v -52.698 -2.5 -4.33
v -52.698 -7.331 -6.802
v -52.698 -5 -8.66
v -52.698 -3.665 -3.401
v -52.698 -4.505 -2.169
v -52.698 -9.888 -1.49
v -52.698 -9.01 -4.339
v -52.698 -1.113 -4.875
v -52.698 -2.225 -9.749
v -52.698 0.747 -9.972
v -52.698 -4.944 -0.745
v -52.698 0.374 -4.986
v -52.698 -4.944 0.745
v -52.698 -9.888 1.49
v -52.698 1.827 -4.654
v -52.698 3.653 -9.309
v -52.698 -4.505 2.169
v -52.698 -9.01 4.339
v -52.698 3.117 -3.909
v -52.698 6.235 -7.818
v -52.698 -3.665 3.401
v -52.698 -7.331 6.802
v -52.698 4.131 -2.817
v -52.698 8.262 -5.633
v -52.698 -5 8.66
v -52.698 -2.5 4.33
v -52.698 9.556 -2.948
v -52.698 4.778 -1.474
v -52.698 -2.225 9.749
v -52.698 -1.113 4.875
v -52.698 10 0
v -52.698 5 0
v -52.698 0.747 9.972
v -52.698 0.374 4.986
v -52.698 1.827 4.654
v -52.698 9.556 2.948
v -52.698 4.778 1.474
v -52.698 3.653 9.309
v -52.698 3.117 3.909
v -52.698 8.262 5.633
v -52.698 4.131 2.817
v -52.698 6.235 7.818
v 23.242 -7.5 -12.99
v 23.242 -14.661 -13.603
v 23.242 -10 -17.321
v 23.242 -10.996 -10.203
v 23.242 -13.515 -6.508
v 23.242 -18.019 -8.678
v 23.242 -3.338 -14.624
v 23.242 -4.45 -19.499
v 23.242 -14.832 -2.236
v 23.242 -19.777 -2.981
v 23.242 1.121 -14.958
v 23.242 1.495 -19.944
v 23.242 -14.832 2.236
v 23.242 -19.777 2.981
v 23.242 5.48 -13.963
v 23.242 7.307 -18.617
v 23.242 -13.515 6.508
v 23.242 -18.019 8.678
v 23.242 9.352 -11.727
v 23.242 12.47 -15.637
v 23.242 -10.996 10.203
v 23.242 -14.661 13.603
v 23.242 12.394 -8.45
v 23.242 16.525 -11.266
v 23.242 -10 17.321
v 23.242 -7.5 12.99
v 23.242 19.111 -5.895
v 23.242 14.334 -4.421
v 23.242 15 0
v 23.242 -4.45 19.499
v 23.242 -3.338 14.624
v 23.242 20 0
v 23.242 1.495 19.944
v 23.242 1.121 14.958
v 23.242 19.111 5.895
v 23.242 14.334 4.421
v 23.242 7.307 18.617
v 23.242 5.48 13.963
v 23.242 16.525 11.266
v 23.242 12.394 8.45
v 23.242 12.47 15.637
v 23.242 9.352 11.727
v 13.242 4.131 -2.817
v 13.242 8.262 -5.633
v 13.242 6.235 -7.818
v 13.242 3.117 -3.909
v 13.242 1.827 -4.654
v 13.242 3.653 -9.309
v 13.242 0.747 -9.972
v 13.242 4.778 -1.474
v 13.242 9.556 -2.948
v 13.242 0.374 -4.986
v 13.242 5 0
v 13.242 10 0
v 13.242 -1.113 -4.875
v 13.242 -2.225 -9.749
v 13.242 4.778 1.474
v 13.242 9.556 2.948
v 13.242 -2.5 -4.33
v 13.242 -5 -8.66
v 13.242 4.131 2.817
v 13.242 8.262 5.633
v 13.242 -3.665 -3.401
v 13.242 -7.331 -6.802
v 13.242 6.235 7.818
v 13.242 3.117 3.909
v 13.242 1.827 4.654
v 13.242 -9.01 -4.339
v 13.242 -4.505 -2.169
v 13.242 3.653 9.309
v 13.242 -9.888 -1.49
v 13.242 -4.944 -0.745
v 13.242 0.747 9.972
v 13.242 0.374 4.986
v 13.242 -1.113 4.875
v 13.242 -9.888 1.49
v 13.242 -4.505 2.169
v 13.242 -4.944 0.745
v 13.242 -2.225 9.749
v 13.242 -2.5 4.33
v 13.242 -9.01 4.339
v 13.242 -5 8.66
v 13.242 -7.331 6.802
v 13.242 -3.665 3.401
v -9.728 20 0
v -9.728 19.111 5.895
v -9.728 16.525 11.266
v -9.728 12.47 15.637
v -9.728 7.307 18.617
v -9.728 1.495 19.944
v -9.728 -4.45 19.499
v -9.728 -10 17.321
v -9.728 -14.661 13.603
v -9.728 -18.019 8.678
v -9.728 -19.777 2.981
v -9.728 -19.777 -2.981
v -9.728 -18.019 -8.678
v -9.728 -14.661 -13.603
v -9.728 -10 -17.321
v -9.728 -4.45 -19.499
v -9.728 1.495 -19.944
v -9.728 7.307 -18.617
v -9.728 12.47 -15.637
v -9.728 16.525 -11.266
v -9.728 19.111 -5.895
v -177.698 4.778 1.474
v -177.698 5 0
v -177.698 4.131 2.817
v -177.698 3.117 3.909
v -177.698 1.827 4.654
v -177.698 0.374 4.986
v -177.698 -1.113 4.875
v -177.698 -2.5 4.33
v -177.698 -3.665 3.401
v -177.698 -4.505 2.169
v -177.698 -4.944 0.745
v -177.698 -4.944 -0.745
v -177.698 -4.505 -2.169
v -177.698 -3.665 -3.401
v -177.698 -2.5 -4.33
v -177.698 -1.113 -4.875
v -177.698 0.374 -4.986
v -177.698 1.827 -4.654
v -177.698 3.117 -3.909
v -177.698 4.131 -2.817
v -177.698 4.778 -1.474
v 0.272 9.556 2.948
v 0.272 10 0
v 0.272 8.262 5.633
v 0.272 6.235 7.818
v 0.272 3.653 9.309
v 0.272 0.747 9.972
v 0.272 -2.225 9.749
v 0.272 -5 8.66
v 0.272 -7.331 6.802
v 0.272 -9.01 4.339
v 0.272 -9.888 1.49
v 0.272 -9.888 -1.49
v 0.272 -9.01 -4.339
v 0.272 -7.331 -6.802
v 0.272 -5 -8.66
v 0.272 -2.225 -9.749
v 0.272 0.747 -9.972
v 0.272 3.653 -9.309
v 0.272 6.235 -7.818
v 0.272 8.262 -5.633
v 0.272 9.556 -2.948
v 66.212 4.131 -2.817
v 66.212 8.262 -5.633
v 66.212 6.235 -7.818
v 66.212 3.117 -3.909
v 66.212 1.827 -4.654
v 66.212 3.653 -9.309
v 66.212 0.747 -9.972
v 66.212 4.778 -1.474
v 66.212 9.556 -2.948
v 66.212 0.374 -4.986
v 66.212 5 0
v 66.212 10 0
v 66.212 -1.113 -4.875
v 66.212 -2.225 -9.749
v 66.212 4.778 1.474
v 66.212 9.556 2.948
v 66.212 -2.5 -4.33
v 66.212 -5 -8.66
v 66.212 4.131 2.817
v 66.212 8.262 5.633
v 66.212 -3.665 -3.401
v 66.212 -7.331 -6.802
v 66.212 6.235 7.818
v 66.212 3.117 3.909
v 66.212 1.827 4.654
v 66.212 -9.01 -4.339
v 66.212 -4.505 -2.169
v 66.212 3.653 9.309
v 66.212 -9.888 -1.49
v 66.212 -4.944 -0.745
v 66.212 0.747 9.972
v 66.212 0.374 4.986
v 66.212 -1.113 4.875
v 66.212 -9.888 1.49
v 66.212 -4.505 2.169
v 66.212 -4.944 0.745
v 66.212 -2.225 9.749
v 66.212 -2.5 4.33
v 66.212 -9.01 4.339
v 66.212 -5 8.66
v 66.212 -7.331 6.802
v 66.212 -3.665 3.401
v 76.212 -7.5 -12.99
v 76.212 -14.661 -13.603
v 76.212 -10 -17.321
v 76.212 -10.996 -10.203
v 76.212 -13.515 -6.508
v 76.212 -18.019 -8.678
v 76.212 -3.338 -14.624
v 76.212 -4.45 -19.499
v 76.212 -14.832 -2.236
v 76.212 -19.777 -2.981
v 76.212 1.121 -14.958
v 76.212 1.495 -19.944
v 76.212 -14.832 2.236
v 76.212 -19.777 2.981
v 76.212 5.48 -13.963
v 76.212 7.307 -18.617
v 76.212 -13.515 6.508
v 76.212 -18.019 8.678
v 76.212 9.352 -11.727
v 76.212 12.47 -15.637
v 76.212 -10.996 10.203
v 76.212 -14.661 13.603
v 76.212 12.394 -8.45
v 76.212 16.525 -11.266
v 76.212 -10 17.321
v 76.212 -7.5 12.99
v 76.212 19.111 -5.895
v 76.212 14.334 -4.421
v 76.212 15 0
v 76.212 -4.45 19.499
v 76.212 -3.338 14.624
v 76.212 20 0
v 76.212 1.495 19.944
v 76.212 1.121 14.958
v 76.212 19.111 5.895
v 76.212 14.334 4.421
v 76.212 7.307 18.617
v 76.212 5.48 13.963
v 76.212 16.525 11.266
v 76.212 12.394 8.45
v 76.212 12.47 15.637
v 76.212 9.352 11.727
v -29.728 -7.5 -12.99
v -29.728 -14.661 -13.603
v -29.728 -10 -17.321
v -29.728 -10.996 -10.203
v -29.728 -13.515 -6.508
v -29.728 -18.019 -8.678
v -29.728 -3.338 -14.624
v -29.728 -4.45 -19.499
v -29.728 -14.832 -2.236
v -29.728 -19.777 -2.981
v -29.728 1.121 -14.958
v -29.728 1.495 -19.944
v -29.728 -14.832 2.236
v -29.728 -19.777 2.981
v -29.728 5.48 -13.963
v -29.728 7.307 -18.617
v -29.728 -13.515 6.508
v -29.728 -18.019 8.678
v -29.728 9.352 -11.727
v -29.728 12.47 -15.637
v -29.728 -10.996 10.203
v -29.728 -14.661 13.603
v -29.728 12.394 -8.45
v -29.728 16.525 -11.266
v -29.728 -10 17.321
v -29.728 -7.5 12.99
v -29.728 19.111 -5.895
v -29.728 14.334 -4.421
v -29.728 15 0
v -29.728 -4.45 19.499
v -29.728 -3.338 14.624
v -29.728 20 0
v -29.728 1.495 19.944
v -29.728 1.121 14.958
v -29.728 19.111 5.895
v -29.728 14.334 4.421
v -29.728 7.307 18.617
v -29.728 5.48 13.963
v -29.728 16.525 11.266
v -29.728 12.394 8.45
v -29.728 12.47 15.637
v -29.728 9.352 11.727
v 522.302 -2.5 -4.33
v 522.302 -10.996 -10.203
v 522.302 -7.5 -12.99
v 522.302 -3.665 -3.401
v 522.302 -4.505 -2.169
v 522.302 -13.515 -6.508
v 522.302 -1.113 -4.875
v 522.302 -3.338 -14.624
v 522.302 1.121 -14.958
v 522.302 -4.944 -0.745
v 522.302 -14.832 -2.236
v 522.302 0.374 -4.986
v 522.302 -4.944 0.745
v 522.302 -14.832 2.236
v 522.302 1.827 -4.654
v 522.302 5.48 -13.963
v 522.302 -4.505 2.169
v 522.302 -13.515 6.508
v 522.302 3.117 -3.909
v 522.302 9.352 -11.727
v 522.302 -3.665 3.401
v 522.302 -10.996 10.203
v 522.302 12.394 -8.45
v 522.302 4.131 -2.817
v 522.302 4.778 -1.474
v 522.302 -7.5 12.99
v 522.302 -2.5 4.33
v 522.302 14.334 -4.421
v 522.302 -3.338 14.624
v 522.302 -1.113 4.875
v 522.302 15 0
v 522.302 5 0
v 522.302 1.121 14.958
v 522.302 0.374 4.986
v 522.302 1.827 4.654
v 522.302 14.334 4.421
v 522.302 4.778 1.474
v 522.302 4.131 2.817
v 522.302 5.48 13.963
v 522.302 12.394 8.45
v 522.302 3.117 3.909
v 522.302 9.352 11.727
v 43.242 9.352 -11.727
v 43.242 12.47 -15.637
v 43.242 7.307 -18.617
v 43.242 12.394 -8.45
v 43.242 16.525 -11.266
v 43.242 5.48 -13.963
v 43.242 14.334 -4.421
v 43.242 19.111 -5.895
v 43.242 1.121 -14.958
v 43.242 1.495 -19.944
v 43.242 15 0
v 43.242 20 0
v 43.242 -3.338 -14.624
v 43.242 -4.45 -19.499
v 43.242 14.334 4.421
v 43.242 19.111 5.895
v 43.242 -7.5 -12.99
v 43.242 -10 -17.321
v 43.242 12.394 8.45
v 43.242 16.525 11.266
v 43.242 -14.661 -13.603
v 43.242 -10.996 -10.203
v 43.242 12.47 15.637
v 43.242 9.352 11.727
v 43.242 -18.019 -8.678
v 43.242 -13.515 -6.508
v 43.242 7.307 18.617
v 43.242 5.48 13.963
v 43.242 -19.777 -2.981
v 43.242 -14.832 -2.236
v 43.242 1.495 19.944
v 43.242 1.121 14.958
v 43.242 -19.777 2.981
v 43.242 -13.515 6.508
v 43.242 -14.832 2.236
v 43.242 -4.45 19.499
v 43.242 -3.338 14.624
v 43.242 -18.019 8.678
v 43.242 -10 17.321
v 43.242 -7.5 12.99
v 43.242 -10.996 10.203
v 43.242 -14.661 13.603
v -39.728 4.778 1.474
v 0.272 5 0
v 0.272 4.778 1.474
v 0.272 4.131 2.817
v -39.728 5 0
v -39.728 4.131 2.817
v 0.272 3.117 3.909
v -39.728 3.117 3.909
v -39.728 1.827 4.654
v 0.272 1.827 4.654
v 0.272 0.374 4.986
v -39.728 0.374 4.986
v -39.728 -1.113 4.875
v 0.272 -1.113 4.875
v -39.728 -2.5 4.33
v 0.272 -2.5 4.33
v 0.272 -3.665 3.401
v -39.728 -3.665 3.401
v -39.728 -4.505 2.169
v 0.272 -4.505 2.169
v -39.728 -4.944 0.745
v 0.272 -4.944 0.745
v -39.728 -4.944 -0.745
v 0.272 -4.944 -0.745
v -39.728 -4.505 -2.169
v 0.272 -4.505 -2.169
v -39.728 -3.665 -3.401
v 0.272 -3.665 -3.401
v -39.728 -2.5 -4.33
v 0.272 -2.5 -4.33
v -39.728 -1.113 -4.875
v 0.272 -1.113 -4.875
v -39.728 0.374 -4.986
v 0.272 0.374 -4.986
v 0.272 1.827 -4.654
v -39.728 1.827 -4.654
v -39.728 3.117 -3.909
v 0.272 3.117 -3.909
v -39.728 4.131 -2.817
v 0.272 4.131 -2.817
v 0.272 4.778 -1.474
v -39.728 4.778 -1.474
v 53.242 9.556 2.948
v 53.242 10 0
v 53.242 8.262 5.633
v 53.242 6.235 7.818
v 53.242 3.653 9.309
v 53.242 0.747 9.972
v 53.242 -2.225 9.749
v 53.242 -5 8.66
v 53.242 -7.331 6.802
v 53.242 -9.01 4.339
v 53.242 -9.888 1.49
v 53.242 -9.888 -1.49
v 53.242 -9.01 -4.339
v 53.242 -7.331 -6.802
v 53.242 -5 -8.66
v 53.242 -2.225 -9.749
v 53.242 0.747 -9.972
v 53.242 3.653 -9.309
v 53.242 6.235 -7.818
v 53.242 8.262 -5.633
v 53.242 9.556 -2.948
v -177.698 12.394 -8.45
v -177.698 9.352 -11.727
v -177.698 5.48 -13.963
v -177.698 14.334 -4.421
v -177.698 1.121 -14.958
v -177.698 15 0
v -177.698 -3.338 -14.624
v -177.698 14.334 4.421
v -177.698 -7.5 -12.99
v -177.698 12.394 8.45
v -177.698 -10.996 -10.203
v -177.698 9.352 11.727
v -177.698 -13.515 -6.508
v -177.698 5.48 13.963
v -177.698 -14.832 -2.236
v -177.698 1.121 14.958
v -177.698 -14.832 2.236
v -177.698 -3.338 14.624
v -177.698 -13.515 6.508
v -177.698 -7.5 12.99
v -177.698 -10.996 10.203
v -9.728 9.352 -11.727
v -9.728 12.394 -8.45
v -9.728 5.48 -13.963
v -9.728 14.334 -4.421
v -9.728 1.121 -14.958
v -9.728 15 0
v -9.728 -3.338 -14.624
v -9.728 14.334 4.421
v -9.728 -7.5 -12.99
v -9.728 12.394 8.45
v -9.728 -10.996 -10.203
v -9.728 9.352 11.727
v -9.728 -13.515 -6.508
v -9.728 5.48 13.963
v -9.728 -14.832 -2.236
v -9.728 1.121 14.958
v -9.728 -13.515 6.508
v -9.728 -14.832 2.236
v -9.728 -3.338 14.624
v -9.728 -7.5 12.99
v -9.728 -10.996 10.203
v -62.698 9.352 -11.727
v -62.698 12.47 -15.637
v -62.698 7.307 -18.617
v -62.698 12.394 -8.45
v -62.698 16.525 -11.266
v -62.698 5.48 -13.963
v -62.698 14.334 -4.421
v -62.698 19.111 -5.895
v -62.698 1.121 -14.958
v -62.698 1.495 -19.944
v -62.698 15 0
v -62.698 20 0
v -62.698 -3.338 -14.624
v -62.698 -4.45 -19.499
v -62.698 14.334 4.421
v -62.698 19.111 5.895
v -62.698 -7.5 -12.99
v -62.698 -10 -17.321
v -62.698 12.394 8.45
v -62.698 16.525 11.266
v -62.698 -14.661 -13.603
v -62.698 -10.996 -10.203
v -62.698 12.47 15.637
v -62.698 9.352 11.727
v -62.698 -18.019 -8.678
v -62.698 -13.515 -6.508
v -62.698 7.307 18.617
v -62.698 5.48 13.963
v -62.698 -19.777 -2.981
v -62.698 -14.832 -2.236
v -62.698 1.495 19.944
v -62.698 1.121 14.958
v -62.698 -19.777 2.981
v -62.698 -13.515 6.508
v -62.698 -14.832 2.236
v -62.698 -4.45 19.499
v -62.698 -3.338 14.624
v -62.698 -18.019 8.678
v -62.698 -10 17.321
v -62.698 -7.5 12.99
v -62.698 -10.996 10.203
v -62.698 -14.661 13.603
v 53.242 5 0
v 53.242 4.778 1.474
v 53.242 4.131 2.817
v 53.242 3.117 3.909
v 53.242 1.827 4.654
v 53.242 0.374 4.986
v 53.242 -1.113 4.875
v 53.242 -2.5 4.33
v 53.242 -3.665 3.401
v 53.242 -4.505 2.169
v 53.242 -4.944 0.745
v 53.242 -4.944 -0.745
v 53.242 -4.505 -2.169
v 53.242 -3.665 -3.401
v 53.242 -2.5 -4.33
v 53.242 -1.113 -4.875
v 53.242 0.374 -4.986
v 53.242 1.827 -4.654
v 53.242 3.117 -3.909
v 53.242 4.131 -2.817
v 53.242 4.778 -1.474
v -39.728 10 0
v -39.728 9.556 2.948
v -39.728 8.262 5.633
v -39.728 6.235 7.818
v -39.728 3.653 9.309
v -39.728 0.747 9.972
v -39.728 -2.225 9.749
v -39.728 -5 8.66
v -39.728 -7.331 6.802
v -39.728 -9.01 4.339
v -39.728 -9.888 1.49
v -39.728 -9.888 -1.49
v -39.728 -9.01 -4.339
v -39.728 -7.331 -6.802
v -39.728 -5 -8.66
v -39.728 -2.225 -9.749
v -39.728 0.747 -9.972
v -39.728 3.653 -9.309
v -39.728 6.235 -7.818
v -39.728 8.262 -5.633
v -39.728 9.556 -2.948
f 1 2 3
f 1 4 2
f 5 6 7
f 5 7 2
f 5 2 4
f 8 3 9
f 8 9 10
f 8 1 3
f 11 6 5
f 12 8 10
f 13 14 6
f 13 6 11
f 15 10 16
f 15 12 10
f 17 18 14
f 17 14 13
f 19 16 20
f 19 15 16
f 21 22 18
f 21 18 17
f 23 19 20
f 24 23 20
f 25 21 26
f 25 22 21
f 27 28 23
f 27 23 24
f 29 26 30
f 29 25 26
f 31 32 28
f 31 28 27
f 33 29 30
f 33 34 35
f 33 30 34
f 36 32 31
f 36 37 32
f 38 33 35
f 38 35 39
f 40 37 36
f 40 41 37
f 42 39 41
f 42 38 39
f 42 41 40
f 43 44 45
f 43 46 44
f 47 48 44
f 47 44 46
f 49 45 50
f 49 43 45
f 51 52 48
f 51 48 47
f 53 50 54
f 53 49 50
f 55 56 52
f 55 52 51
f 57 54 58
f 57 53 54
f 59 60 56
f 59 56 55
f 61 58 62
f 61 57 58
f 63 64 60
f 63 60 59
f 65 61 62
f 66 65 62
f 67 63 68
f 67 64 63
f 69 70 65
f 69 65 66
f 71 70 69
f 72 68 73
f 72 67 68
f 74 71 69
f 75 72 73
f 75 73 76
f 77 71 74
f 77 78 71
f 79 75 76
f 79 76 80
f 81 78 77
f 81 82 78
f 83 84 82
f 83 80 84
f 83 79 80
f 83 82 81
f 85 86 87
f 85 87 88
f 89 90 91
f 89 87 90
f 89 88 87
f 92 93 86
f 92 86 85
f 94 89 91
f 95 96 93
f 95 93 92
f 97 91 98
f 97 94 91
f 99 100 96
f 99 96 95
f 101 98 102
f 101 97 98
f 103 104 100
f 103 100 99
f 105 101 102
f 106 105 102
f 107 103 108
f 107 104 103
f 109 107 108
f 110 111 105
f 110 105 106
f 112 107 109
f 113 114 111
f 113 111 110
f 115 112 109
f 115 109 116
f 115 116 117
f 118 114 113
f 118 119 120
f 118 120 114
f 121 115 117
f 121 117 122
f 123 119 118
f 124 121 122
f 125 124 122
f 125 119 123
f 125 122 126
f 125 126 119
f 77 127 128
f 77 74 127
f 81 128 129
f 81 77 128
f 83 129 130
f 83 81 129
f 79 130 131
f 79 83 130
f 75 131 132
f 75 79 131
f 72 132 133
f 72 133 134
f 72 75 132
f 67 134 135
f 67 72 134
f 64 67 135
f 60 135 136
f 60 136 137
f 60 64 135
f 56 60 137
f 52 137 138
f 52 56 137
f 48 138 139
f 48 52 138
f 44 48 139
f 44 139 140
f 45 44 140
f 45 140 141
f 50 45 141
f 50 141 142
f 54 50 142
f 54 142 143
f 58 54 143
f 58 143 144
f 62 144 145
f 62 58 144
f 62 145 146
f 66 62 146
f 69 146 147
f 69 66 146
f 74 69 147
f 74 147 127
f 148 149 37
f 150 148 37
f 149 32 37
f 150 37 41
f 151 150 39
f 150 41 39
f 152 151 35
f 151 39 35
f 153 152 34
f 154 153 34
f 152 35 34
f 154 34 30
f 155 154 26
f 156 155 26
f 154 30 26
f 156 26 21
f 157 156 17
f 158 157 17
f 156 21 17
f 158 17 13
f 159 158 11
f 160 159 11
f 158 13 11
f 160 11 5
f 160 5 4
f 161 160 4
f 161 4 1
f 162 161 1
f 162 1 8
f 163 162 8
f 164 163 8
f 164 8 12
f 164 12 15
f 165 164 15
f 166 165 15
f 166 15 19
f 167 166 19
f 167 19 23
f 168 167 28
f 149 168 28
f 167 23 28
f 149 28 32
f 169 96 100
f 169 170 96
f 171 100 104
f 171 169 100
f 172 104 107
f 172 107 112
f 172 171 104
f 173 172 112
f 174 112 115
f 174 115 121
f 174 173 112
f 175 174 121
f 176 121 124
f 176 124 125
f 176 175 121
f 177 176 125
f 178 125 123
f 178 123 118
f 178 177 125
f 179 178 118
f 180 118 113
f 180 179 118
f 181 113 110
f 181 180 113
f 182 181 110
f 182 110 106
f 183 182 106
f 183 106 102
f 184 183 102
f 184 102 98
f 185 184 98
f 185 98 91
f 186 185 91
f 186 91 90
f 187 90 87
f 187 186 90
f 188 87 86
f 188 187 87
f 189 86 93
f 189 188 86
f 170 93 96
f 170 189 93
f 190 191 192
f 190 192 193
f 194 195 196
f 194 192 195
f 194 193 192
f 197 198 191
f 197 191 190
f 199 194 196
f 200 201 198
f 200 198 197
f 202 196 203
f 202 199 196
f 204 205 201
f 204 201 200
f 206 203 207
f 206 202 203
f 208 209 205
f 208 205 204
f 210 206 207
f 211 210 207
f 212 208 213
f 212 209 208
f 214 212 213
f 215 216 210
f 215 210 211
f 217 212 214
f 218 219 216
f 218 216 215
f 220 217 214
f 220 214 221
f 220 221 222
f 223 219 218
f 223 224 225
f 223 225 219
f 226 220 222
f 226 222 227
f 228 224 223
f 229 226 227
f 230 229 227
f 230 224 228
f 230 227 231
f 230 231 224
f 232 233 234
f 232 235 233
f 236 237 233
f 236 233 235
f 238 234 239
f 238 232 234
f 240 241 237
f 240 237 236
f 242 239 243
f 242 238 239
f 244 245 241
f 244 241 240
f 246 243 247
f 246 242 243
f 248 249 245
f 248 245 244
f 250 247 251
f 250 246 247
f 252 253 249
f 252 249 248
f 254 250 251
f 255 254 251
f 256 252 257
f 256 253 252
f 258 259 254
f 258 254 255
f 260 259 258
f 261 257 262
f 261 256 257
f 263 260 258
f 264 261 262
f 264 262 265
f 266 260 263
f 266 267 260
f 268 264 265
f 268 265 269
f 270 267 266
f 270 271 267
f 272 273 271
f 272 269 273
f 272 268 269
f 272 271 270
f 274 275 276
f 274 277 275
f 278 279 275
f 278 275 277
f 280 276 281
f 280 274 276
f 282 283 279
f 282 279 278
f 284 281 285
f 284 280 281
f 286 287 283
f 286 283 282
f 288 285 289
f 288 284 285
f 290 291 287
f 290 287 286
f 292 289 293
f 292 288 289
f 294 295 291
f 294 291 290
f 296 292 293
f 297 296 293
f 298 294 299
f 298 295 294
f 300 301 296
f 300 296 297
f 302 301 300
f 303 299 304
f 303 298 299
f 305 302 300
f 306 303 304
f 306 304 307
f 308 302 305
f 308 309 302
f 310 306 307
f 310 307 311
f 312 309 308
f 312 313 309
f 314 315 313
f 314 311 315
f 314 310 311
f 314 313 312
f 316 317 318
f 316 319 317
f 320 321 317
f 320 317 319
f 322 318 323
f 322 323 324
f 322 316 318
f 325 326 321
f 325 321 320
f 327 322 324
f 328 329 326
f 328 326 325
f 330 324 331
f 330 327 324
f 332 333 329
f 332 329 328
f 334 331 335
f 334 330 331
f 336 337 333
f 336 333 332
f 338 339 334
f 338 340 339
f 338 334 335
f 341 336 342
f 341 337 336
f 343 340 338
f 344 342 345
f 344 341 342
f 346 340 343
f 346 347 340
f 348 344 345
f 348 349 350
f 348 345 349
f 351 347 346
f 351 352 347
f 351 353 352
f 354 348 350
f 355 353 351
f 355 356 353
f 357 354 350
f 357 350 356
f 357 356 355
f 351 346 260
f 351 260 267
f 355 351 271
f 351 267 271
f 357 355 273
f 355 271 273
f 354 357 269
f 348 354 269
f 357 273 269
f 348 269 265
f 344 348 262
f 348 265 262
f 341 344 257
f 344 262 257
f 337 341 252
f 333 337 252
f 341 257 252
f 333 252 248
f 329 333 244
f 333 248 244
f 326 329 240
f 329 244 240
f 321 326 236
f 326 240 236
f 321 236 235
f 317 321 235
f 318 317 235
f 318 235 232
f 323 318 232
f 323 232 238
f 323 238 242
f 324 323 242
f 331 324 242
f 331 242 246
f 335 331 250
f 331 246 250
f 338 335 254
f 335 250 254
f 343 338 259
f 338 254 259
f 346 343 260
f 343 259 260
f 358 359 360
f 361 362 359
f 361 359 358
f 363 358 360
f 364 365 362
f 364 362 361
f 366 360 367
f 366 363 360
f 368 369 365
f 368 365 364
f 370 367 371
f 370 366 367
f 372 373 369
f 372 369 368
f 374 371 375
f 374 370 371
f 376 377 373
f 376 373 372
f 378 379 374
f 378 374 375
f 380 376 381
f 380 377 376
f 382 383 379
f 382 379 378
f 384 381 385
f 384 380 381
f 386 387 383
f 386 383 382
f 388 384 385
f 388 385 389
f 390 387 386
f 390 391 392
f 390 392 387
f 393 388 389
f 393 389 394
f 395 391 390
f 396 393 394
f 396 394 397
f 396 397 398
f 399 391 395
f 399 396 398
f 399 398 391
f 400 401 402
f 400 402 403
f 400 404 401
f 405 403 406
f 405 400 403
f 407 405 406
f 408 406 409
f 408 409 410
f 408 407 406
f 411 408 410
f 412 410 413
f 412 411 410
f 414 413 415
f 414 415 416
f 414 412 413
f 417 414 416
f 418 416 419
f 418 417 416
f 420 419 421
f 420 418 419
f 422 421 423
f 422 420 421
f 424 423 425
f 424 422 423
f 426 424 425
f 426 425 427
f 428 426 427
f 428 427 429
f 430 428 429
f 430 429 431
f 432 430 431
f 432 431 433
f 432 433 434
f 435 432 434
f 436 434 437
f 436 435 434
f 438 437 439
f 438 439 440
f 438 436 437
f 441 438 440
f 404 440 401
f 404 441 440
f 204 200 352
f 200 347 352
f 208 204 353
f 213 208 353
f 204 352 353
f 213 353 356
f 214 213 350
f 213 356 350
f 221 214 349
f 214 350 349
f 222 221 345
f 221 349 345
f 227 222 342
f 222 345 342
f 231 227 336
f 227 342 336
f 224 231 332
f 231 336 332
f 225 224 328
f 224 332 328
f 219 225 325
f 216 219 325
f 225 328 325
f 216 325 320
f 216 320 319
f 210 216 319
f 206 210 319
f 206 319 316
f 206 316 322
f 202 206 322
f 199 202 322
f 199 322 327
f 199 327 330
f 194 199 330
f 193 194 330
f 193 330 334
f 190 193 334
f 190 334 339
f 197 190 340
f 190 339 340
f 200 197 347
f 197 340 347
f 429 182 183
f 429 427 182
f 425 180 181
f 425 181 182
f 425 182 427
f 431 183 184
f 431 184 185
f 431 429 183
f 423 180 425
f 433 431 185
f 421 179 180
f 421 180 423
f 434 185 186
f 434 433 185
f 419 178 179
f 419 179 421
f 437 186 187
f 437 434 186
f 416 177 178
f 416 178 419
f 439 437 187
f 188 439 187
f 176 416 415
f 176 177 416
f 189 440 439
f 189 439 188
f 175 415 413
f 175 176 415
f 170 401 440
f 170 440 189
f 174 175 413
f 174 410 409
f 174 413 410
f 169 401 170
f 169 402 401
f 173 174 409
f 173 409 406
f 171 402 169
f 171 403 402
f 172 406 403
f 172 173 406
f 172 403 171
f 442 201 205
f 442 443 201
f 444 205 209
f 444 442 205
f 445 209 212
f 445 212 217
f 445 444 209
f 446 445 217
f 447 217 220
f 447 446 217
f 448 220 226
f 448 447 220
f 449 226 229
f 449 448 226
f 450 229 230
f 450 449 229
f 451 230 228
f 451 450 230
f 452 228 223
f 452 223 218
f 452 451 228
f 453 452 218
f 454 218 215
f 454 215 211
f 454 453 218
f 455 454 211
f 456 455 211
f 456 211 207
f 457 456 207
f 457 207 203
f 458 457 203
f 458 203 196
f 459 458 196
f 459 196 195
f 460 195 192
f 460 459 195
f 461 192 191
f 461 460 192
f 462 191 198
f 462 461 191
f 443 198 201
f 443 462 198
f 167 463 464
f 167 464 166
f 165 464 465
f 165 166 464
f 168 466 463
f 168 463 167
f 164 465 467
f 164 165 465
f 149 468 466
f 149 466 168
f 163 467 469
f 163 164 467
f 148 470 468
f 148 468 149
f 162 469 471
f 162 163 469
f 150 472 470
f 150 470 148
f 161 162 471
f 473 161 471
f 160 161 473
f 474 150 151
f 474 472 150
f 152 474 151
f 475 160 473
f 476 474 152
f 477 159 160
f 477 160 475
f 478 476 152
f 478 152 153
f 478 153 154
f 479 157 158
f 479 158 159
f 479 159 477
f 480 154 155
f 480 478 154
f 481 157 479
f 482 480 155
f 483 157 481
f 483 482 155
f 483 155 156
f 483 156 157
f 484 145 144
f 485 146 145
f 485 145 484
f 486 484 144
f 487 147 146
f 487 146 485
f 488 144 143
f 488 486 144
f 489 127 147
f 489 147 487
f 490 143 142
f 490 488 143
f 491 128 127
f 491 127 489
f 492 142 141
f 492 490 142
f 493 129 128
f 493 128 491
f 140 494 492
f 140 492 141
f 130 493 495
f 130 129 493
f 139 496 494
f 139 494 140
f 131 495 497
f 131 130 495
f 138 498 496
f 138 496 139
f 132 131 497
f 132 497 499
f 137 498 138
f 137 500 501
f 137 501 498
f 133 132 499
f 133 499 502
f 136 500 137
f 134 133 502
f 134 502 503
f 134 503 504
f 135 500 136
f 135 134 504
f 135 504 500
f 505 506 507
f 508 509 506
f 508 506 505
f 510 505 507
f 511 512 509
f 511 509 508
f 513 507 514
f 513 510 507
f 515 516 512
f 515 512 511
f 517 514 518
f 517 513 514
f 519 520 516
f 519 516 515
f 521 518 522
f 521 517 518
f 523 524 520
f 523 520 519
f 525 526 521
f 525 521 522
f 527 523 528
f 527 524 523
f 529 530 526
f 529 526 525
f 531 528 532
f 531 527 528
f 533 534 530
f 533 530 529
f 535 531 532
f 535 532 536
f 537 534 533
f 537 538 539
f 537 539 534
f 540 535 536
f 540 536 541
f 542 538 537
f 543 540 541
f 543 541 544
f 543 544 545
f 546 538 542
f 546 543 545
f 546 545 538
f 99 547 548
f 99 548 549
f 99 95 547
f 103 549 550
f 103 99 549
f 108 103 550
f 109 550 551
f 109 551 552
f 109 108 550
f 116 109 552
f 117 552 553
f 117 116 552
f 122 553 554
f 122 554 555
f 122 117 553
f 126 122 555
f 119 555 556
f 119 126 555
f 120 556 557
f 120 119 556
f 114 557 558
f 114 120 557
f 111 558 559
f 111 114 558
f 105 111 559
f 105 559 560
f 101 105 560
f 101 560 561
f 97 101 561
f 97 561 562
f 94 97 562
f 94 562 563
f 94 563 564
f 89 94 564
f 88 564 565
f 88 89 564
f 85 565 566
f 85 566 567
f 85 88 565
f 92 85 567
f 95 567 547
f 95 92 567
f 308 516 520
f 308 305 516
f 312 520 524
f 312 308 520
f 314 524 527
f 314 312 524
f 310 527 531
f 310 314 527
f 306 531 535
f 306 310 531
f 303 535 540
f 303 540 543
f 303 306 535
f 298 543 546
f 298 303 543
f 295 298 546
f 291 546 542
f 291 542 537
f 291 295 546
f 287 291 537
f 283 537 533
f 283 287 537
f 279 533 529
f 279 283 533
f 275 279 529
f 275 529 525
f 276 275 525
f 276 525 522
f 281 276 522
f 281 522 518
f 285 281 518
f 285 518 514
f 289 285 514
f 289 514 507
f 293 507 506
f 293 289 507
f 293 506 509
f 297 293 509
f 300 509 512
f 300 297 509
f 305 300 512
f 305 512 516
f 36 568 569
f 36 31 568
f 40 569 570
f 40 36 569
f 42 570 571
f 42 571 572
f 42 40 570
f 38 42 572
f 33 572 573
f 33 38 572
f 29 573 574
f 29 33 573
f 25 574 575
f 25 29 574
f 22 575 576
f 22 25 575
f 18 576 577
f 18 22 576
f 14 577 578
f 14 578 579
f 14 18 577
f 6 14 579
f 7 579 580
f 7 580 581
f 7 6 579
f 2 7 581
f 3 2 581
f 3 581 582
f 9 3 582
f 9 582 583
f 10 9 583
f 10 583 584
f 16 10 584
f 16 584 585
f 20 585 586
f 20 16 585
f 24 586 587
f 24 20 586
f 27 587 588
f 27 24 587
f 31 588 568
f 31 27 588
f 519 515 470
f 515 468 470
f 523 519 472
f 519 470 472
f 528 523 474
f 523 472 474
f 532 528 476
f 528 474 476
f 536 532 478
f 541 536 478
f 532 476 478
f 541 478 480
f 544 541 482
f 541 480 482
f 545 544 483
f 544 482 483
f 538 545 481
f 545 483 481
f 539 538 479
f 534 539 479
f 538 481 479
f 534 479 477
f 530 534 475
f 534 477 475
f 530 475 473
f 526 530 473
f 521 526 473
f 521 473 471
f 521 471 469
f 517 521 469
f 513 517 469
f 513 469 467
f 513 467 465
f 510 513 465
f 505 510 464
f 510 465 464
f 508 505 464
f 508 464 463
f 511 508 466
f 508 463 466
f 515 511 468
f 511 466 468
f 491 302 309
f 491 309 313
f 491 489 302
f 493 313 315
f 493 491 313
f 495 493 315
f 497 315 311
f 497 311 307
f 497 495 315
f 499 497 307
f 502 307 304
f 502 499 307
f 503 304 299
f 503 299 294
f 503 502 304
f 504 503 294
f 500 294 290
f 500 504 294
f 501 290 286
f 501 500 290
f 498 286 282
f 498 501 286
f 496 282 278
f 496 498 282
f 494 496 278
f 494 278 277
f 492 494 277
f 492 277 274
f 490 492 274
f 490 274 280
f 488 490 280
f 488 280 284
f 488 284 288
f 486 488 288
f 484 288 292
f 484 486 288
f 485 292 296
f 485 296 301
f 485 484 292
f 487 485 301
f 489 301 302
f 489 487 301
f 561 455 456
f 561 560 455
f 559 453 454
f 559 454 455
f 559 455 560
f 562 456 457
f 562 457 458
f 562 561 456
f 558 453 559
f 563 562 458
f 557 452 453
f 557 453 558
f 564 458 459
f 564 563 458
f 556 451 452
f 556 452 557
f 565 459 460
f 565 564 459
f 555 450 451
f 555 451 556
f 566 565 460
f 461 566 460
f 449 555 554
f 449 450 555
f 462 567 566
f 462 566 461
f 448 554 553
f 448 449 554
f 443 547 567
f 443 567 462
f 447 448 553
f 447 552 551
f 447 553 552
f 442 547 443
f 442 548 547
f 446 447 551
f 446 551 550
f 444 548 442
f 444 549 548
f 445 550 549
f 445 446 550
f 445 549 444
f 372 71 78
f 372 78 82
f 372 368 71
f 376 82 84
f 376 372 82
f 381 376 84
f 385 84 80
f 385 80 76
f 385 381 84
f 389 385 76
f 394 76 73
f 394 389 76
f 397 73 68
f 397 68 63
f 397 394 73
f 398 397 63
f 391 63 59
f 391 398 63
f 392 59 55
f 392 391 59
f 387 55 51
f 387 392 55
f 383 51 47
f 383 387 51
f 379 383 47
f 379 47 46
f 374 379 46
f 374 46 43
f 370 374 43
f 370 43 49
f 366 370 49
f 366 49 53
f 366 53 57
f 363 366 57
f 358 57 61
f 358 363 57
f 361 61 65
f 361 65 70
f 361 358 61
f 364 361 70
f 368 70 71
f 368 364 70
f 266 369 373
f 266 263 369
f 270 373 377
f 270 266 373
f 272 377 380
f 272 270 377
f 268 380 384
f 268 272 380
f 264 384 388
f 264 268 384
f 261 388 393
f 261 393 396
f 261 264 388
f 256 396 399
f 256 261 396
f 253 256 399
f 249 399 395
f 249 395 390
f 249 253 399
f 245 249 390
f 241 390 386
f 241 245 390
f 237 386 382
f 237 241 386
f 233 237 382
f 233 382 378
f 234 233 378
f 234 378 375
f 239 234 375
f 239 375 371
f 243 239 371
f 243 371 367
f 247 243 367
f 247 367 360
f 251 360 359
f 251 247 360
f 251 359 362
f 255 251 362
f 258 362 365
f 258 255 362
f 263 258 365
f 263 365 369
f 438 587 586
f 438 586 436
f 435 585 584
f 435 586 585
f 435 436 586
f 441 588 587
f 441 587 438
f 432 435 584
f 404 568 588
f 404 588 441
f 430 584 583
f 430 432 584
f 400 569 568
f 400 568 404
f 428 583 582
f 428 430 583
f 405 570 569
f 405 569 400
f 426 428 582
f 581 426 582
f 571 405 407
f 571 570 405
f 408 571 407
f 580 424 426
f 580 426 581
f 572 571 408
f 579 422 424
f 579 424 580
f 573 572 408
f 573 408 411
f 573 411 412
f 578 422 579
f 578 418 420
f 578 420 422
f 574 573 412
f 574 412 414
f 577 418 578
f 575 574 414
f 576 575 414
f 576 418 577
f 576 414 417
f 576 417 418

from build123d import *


with BuildPart() as part:
    # Sketch1 → Revolve-Thin1 (revolve)
    with BuildSketch(Plane.XY):
        Polygon((-177.698412698, 15), (-152.698412698, 15), (-62.698412698, 15), (-62.698412698, 20), (-29.728412698, 20), (-29.728412698, 15), (-9.728412698, 15), (-9.728412698, 20), (23.241587302, 20), (23.241587302, 15), (43.241587302, 15), (43.241587302, 20), (76.211587302, 20), (76.211587302, 15), (192.237786857, 15), (497.301587302, 15), (522.301587302, 15), (522.301587302, 5), (497.301587302, 5), (192.237786857, 5), (66.211587302, 5), (66.211587302, 10), (53.241587302, 10), (53.241587302, 5), (13.241587302, 5), (13.241587302, 10), (0.271587302, 10), (0.271587302, 5), (-39.728412698, 5), (-39.728412698, 10), (-52.698412698, 10), (-52.698412698, 5), (-152.698412698, 5), (-177.698412698, 5), align=None)
    revolve(axis=Axis((-114.603174603, 0, 0), (1, 0, 0)))


solid = part.part
